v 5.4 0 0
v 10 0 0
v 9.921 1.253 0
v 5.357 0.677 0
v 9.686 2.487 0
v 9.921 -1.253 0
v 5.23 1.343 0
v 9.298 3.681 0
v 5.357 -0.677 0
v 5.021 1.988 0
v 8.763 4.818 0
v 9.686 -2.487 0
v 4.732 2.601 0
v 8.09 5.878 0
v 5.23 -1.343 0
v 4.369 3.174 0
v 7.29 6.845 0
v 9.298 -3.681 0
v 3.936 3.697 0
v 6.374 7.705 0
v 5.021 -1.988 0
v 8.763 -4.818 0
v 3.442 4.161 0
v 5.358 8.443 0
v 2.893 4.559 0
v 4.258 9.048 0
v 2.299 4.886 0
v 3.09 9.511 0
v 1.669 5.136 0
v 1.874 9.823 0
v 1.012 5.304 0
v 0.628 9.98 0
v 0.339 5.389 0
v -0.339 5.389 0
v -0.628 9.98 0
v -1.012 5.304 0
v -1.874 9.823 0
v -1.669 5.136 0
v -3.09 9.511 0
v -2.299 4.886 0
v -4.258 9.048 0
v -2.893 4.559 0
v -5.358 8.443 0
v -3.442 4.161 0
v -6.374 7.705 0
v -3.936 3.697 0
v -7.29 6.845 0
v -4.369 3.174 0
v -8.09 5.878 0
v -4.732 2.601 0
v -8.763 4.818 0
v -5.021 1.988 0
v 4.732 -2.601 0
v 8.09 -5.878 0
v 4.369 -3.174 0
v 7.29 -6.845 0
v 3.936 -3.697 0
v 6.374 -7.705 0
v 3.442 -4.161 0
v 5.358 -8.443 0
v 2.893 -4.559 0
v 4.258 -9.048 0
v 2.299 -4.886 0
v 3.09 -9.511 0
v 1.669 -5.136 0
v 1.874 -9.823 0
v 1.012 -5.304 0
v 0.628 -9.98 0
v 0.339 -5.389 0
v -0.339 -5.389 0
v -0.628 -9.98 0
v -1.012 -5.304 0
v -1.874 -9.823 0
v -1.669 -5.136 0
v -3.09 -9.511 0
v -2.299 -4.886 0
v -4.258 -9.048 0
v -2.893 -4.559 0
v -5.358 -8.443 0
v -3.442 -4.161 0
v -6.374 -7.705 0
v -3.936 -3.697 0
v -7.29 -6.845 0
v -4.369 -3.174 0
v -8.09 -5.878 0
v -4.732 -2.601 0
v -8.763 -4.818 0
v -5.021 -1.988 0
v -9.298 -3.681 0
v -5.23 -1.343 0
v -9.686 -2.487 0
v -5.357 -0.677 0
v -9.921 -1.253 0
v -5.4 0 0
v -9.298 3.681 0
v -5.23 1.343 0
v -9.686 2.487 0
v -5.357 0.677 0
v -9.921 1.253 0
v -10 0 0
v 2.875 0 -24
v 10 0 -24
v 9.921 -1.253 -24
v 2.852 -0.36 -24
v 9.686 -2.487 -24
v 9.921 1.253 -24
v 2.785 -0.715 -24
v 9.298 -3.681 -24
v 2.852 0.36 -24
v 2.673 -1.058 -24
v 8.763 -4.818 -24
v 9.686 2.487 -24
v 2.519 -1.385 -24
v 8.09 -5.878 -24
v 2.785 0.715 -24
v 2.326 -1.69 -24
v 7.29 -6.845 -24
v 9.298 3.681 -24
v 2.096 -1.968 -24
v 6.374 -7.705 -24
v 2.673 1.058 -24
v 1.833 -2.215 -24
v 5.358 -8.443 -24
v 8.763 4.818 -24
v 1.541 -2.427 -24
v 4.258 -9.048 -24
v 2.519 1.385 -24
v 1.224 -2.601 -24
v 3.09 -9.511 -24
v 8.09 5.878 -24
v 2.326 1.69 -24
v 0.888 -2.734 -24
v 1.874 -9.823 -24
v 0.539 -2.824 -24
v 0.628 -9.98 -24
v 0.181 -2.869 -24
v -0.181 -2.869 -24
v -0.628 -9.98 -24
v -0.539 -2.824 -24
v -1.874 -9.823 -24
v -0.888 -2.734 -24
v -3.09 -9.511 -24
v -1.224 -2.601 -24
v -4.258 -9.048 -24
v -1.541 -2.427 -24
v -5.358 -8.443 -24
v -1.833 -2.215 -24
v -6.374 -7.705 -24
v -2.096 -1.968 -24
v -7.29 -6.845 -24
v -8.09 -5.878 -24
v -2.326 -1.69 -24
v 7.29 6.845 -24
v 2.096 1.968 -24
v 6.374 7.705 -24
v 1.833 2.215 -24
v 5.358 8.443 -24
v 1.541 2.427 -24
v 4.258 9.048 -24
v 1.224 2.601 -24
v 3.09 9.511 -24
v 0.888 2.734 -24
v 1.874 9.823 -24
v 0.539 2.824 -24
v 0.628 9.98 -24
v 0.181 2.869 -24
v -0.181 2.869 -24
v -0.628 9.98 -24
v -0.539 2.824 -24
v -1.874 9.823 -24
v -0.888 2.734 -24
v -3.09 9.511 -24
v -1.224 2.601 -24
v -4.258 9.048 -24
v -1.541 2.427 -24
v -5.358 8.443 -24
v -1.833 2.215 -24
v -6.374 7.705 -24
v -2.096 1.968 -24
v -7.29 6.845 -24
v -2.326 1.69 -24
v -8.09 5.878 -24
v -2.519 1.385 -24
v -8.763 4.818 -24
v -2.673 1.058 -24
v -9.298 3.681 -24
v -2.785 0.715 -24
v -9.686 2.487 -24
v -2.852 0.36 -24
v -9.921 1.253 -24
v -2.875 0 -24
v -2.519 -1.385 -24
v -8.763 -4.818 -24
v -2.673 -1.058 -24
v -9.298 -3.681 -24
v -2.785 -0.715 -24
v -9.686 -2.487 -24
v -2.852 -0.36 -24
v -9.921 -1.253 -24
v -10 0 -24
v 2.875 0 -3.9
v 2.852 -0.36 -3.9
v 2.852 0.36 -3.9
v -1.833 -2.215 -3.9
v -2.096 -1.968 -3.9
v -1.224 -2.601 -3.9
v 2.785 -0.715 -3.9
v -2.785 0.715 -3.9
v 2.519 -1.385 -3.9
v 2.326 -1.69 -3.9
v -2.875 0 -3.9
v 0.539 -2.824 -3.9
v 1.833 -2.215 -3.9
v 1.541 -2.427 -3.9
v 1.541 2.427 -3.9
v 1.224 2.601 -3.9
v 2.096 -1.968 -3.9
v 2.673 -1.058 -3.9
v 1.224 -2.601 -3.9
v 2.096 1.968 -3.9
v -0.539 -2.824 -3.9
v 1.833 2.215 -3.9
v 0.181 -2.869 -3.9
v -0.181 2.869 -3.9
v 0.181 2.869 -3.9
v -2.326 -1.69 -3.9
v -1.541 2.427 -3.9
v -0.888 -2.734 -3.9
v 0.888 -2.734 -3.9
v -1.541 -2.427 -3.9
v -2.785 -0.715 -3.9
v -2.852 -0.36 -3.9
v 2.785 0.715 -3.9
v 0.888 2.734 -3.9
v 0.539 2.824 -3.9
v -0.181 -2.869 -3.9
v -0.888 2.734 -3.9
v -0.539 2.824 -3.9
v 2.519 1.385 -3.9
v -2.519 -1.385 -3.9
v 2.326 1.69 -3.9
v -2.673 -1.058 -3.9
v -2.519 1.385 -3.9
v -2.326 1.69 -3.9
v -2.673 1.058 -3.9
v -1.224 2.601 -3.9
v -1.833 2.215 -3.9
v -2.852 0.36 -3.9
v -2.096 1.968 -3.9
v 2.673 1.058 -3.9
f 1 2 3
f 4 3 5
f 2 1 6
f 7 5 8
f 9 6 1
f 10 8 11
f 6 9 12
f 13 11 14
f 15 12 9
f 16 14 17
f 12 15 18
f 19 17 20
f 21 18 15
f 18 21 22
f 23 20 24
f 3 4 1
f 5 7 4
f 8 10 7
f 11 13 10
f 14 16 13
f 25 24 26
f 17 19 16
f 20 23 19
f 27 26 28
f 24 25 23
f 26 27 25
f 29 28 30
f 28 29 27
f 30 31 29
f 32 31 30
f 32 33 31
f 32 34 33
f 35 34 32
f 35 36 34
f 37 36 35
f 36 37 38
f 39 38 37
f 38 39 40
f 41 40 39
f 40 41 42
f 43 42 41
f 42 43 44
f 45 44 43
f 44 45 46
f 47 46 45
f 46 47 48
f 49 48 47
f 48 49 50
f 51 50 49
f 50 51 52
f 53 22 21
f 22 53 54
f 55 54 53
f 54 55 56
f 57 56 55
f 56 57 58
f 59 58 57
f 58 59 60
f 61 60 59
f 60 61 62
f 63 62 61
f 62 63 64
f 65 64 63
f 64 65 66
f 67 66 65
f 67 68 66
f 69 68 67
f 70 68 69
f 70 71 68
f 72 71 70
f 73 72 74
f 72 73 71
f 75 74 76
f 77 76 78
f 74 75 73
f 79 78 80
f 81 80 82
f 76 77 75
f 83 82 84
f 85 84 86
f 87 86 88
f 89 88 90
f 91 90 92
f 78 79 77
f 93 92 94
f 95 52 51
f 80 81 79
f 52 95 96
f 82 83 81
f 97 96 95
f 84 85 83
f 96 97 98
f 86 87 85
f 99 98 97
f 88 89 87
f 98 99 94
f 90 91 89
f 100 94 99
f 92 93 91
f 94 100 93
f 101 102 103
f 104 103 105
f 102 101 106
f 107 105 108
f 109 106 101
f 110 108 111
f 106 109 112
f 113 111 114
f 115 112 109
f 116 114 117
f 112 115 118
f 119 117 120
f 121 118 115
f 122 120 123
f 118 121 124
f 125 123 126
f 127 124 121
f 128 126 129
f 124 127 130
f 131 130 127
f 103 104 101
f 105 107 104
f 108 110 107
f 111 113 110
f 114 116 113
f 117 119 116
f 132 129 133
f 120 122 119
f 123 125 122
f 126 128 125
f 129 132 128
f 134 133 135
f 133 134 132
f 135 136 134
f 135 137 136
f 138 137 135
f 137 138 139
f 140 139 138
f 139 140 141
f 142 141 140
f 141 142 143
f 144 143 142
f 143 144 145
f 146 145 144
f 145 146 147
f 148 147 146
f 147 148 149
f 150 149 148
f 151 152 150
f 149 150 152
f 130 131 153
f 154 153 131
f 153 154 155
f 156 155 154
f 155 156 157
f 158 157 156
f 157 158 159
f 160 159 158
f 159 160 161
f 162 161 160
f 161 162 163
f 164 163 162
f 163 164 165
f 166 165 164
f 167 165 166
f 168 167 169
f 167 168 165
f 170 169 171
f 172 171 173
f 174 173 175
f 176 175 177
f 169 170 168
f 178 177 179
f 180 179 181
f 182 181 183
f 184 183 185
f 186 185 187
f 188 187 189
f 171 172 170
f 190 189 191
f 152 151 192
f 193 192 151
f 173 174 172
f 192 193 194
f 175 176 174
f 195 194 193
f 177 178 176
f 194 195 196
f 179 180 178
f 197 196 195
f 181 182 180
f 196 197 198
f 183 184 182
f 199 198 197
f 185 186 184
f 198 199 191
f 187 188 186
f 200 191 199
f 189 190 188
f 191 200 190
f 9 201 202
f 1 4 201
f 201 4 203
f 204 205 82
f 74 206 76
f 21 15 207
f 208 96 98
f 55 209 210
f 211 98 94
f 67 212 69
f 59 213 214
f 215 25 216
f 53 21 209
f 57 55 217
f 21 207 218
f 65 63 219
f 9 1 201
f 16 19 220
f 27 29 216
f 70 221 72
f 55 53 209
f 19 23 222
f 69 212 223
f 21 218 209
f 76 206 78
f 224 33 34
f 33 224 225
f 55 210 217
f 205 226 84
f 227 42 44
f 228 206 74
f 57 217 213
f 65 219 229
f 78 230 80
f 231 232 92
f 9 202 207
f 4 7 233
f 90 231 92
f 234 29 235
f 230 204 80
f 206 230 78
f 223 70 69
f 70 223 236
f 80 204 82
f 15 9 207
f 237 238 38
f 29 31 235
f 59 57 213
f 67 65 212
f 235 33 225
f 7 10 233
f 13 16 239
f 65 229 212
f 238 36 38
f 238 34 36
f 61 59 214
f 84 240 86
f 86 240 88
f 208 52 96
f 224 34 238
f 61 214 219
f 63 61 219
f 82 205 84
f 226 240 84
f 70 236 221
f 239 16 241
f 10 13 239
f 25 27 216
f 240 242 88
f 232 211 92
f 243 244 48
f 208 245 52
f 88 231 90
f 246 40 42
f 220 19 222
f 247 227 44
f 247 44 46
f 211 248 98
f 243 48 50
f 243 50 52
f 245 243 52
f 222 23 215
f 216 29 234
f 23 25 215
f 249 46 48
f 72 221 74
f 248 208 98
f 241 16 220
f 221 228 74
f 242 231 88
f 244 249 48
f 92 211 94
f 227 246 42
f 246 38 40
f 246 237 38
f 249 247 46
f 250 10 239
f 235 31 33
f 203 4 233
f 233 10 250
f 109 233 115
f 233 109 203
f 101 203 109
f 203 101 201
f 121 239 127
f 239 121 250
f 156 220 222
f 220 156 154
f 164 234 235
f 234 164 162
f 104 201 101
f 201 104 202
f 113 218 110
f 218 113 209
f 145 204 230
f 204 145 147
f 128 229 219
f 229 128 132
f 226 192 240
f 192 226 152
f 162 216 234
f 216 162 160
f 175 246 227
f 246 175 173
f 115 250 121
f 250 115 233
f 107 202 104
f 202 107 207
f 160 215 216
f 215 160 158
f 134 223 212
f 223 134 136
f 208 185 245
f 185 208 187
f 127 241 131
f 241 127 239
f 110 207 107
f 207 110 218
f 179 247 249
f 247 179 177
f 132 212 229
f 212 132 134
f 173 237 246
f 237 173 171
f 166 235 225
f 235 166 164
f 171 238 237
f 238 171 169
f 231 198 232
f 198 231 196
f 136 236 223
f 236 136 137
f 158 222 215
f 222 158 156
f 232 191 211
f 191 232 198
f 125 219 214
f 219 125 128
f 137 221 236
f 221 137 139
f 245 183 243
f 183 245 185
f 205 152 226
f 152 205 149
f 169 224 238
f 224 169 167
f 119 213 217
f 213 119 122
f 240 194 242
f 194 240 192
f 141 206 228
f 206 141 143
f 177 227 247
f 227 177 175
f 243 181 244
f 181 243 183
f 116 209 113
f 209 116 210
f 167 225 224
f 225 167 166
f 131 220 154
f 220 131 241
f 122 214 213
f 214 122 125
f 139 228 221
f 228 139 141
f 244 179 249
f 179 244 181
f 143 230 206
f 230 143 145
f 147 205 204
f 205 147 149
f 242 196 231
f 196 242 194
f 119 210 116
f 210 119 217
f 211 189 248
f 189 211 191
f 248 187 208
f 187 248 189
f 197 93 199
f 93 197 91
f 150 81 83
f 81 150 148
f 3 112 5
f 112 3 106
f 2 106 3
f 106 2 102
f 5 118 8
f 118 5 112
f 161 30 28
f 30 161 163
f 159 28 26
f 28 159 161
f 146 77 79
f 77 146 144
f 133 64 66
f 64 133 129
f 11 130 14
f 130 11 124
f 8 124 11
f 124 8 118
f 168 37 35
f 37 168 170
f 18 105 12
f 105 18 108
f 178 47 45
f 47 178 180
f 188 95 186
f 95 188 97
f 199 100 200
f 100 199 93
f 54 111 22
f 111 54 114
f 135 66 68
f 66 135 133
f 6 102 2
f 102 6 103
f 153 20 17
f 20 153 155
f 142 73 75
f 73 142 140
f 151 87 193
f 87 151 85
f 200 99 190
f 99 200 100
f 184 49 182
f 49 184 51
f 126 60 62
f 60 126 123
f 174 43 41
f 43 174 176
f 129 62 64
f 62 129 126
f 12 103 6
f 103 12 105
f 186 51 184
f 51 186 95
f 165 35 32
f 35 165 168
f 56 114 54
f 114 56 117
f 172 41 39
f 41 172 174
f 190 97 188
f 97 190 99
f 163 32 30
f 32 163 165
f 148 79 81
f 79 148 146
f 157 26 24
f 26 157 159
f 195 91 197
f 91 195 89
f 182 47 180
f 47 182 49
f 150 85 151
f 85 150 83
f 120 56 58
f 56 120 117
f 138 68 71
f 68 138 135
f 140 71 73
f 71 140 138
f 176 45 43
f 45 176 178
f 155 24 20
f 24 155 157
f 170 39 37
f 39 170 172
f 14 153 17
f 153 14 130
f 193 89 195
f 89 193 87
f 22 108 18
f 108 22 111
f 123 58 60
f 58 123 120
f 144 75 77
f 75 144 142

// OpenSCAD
$fn = 50;


difference() {
	union() {
		translate(v = [0, 0, -24.0000000000]) {
			cylinder(h = 24, r = 10.0000000000);
		}
		cylinder(h = 0, r = 16.0000000000);
	}
	union() {
		translate(v = [0, 0, 0]) {
			rotate(a = [0, 0, 0]) {
				difference() {
					union() {
						#translate(v = [0, 0, -24.0000000000]) {
							cylinder(h = 24, r = 2.6000000000);
						}
						#translate(v = [0, 0, -3.9000000000]) {
							cylinder(h = 3.9000000000, r1 = 2.8750000000, r2 = 5.4000000000);
						}
						#translate(v = [0, 0, -24.0000000000]) {
							cylinder(h = 24, r = 2.8750000000);
						}
						#translate(v = [0, 0, -24.0000000000]) {
							cylinder(h = 24, r = 2.6000000000);
						}
					}
					union();
				}
			}
		}
	}
}
